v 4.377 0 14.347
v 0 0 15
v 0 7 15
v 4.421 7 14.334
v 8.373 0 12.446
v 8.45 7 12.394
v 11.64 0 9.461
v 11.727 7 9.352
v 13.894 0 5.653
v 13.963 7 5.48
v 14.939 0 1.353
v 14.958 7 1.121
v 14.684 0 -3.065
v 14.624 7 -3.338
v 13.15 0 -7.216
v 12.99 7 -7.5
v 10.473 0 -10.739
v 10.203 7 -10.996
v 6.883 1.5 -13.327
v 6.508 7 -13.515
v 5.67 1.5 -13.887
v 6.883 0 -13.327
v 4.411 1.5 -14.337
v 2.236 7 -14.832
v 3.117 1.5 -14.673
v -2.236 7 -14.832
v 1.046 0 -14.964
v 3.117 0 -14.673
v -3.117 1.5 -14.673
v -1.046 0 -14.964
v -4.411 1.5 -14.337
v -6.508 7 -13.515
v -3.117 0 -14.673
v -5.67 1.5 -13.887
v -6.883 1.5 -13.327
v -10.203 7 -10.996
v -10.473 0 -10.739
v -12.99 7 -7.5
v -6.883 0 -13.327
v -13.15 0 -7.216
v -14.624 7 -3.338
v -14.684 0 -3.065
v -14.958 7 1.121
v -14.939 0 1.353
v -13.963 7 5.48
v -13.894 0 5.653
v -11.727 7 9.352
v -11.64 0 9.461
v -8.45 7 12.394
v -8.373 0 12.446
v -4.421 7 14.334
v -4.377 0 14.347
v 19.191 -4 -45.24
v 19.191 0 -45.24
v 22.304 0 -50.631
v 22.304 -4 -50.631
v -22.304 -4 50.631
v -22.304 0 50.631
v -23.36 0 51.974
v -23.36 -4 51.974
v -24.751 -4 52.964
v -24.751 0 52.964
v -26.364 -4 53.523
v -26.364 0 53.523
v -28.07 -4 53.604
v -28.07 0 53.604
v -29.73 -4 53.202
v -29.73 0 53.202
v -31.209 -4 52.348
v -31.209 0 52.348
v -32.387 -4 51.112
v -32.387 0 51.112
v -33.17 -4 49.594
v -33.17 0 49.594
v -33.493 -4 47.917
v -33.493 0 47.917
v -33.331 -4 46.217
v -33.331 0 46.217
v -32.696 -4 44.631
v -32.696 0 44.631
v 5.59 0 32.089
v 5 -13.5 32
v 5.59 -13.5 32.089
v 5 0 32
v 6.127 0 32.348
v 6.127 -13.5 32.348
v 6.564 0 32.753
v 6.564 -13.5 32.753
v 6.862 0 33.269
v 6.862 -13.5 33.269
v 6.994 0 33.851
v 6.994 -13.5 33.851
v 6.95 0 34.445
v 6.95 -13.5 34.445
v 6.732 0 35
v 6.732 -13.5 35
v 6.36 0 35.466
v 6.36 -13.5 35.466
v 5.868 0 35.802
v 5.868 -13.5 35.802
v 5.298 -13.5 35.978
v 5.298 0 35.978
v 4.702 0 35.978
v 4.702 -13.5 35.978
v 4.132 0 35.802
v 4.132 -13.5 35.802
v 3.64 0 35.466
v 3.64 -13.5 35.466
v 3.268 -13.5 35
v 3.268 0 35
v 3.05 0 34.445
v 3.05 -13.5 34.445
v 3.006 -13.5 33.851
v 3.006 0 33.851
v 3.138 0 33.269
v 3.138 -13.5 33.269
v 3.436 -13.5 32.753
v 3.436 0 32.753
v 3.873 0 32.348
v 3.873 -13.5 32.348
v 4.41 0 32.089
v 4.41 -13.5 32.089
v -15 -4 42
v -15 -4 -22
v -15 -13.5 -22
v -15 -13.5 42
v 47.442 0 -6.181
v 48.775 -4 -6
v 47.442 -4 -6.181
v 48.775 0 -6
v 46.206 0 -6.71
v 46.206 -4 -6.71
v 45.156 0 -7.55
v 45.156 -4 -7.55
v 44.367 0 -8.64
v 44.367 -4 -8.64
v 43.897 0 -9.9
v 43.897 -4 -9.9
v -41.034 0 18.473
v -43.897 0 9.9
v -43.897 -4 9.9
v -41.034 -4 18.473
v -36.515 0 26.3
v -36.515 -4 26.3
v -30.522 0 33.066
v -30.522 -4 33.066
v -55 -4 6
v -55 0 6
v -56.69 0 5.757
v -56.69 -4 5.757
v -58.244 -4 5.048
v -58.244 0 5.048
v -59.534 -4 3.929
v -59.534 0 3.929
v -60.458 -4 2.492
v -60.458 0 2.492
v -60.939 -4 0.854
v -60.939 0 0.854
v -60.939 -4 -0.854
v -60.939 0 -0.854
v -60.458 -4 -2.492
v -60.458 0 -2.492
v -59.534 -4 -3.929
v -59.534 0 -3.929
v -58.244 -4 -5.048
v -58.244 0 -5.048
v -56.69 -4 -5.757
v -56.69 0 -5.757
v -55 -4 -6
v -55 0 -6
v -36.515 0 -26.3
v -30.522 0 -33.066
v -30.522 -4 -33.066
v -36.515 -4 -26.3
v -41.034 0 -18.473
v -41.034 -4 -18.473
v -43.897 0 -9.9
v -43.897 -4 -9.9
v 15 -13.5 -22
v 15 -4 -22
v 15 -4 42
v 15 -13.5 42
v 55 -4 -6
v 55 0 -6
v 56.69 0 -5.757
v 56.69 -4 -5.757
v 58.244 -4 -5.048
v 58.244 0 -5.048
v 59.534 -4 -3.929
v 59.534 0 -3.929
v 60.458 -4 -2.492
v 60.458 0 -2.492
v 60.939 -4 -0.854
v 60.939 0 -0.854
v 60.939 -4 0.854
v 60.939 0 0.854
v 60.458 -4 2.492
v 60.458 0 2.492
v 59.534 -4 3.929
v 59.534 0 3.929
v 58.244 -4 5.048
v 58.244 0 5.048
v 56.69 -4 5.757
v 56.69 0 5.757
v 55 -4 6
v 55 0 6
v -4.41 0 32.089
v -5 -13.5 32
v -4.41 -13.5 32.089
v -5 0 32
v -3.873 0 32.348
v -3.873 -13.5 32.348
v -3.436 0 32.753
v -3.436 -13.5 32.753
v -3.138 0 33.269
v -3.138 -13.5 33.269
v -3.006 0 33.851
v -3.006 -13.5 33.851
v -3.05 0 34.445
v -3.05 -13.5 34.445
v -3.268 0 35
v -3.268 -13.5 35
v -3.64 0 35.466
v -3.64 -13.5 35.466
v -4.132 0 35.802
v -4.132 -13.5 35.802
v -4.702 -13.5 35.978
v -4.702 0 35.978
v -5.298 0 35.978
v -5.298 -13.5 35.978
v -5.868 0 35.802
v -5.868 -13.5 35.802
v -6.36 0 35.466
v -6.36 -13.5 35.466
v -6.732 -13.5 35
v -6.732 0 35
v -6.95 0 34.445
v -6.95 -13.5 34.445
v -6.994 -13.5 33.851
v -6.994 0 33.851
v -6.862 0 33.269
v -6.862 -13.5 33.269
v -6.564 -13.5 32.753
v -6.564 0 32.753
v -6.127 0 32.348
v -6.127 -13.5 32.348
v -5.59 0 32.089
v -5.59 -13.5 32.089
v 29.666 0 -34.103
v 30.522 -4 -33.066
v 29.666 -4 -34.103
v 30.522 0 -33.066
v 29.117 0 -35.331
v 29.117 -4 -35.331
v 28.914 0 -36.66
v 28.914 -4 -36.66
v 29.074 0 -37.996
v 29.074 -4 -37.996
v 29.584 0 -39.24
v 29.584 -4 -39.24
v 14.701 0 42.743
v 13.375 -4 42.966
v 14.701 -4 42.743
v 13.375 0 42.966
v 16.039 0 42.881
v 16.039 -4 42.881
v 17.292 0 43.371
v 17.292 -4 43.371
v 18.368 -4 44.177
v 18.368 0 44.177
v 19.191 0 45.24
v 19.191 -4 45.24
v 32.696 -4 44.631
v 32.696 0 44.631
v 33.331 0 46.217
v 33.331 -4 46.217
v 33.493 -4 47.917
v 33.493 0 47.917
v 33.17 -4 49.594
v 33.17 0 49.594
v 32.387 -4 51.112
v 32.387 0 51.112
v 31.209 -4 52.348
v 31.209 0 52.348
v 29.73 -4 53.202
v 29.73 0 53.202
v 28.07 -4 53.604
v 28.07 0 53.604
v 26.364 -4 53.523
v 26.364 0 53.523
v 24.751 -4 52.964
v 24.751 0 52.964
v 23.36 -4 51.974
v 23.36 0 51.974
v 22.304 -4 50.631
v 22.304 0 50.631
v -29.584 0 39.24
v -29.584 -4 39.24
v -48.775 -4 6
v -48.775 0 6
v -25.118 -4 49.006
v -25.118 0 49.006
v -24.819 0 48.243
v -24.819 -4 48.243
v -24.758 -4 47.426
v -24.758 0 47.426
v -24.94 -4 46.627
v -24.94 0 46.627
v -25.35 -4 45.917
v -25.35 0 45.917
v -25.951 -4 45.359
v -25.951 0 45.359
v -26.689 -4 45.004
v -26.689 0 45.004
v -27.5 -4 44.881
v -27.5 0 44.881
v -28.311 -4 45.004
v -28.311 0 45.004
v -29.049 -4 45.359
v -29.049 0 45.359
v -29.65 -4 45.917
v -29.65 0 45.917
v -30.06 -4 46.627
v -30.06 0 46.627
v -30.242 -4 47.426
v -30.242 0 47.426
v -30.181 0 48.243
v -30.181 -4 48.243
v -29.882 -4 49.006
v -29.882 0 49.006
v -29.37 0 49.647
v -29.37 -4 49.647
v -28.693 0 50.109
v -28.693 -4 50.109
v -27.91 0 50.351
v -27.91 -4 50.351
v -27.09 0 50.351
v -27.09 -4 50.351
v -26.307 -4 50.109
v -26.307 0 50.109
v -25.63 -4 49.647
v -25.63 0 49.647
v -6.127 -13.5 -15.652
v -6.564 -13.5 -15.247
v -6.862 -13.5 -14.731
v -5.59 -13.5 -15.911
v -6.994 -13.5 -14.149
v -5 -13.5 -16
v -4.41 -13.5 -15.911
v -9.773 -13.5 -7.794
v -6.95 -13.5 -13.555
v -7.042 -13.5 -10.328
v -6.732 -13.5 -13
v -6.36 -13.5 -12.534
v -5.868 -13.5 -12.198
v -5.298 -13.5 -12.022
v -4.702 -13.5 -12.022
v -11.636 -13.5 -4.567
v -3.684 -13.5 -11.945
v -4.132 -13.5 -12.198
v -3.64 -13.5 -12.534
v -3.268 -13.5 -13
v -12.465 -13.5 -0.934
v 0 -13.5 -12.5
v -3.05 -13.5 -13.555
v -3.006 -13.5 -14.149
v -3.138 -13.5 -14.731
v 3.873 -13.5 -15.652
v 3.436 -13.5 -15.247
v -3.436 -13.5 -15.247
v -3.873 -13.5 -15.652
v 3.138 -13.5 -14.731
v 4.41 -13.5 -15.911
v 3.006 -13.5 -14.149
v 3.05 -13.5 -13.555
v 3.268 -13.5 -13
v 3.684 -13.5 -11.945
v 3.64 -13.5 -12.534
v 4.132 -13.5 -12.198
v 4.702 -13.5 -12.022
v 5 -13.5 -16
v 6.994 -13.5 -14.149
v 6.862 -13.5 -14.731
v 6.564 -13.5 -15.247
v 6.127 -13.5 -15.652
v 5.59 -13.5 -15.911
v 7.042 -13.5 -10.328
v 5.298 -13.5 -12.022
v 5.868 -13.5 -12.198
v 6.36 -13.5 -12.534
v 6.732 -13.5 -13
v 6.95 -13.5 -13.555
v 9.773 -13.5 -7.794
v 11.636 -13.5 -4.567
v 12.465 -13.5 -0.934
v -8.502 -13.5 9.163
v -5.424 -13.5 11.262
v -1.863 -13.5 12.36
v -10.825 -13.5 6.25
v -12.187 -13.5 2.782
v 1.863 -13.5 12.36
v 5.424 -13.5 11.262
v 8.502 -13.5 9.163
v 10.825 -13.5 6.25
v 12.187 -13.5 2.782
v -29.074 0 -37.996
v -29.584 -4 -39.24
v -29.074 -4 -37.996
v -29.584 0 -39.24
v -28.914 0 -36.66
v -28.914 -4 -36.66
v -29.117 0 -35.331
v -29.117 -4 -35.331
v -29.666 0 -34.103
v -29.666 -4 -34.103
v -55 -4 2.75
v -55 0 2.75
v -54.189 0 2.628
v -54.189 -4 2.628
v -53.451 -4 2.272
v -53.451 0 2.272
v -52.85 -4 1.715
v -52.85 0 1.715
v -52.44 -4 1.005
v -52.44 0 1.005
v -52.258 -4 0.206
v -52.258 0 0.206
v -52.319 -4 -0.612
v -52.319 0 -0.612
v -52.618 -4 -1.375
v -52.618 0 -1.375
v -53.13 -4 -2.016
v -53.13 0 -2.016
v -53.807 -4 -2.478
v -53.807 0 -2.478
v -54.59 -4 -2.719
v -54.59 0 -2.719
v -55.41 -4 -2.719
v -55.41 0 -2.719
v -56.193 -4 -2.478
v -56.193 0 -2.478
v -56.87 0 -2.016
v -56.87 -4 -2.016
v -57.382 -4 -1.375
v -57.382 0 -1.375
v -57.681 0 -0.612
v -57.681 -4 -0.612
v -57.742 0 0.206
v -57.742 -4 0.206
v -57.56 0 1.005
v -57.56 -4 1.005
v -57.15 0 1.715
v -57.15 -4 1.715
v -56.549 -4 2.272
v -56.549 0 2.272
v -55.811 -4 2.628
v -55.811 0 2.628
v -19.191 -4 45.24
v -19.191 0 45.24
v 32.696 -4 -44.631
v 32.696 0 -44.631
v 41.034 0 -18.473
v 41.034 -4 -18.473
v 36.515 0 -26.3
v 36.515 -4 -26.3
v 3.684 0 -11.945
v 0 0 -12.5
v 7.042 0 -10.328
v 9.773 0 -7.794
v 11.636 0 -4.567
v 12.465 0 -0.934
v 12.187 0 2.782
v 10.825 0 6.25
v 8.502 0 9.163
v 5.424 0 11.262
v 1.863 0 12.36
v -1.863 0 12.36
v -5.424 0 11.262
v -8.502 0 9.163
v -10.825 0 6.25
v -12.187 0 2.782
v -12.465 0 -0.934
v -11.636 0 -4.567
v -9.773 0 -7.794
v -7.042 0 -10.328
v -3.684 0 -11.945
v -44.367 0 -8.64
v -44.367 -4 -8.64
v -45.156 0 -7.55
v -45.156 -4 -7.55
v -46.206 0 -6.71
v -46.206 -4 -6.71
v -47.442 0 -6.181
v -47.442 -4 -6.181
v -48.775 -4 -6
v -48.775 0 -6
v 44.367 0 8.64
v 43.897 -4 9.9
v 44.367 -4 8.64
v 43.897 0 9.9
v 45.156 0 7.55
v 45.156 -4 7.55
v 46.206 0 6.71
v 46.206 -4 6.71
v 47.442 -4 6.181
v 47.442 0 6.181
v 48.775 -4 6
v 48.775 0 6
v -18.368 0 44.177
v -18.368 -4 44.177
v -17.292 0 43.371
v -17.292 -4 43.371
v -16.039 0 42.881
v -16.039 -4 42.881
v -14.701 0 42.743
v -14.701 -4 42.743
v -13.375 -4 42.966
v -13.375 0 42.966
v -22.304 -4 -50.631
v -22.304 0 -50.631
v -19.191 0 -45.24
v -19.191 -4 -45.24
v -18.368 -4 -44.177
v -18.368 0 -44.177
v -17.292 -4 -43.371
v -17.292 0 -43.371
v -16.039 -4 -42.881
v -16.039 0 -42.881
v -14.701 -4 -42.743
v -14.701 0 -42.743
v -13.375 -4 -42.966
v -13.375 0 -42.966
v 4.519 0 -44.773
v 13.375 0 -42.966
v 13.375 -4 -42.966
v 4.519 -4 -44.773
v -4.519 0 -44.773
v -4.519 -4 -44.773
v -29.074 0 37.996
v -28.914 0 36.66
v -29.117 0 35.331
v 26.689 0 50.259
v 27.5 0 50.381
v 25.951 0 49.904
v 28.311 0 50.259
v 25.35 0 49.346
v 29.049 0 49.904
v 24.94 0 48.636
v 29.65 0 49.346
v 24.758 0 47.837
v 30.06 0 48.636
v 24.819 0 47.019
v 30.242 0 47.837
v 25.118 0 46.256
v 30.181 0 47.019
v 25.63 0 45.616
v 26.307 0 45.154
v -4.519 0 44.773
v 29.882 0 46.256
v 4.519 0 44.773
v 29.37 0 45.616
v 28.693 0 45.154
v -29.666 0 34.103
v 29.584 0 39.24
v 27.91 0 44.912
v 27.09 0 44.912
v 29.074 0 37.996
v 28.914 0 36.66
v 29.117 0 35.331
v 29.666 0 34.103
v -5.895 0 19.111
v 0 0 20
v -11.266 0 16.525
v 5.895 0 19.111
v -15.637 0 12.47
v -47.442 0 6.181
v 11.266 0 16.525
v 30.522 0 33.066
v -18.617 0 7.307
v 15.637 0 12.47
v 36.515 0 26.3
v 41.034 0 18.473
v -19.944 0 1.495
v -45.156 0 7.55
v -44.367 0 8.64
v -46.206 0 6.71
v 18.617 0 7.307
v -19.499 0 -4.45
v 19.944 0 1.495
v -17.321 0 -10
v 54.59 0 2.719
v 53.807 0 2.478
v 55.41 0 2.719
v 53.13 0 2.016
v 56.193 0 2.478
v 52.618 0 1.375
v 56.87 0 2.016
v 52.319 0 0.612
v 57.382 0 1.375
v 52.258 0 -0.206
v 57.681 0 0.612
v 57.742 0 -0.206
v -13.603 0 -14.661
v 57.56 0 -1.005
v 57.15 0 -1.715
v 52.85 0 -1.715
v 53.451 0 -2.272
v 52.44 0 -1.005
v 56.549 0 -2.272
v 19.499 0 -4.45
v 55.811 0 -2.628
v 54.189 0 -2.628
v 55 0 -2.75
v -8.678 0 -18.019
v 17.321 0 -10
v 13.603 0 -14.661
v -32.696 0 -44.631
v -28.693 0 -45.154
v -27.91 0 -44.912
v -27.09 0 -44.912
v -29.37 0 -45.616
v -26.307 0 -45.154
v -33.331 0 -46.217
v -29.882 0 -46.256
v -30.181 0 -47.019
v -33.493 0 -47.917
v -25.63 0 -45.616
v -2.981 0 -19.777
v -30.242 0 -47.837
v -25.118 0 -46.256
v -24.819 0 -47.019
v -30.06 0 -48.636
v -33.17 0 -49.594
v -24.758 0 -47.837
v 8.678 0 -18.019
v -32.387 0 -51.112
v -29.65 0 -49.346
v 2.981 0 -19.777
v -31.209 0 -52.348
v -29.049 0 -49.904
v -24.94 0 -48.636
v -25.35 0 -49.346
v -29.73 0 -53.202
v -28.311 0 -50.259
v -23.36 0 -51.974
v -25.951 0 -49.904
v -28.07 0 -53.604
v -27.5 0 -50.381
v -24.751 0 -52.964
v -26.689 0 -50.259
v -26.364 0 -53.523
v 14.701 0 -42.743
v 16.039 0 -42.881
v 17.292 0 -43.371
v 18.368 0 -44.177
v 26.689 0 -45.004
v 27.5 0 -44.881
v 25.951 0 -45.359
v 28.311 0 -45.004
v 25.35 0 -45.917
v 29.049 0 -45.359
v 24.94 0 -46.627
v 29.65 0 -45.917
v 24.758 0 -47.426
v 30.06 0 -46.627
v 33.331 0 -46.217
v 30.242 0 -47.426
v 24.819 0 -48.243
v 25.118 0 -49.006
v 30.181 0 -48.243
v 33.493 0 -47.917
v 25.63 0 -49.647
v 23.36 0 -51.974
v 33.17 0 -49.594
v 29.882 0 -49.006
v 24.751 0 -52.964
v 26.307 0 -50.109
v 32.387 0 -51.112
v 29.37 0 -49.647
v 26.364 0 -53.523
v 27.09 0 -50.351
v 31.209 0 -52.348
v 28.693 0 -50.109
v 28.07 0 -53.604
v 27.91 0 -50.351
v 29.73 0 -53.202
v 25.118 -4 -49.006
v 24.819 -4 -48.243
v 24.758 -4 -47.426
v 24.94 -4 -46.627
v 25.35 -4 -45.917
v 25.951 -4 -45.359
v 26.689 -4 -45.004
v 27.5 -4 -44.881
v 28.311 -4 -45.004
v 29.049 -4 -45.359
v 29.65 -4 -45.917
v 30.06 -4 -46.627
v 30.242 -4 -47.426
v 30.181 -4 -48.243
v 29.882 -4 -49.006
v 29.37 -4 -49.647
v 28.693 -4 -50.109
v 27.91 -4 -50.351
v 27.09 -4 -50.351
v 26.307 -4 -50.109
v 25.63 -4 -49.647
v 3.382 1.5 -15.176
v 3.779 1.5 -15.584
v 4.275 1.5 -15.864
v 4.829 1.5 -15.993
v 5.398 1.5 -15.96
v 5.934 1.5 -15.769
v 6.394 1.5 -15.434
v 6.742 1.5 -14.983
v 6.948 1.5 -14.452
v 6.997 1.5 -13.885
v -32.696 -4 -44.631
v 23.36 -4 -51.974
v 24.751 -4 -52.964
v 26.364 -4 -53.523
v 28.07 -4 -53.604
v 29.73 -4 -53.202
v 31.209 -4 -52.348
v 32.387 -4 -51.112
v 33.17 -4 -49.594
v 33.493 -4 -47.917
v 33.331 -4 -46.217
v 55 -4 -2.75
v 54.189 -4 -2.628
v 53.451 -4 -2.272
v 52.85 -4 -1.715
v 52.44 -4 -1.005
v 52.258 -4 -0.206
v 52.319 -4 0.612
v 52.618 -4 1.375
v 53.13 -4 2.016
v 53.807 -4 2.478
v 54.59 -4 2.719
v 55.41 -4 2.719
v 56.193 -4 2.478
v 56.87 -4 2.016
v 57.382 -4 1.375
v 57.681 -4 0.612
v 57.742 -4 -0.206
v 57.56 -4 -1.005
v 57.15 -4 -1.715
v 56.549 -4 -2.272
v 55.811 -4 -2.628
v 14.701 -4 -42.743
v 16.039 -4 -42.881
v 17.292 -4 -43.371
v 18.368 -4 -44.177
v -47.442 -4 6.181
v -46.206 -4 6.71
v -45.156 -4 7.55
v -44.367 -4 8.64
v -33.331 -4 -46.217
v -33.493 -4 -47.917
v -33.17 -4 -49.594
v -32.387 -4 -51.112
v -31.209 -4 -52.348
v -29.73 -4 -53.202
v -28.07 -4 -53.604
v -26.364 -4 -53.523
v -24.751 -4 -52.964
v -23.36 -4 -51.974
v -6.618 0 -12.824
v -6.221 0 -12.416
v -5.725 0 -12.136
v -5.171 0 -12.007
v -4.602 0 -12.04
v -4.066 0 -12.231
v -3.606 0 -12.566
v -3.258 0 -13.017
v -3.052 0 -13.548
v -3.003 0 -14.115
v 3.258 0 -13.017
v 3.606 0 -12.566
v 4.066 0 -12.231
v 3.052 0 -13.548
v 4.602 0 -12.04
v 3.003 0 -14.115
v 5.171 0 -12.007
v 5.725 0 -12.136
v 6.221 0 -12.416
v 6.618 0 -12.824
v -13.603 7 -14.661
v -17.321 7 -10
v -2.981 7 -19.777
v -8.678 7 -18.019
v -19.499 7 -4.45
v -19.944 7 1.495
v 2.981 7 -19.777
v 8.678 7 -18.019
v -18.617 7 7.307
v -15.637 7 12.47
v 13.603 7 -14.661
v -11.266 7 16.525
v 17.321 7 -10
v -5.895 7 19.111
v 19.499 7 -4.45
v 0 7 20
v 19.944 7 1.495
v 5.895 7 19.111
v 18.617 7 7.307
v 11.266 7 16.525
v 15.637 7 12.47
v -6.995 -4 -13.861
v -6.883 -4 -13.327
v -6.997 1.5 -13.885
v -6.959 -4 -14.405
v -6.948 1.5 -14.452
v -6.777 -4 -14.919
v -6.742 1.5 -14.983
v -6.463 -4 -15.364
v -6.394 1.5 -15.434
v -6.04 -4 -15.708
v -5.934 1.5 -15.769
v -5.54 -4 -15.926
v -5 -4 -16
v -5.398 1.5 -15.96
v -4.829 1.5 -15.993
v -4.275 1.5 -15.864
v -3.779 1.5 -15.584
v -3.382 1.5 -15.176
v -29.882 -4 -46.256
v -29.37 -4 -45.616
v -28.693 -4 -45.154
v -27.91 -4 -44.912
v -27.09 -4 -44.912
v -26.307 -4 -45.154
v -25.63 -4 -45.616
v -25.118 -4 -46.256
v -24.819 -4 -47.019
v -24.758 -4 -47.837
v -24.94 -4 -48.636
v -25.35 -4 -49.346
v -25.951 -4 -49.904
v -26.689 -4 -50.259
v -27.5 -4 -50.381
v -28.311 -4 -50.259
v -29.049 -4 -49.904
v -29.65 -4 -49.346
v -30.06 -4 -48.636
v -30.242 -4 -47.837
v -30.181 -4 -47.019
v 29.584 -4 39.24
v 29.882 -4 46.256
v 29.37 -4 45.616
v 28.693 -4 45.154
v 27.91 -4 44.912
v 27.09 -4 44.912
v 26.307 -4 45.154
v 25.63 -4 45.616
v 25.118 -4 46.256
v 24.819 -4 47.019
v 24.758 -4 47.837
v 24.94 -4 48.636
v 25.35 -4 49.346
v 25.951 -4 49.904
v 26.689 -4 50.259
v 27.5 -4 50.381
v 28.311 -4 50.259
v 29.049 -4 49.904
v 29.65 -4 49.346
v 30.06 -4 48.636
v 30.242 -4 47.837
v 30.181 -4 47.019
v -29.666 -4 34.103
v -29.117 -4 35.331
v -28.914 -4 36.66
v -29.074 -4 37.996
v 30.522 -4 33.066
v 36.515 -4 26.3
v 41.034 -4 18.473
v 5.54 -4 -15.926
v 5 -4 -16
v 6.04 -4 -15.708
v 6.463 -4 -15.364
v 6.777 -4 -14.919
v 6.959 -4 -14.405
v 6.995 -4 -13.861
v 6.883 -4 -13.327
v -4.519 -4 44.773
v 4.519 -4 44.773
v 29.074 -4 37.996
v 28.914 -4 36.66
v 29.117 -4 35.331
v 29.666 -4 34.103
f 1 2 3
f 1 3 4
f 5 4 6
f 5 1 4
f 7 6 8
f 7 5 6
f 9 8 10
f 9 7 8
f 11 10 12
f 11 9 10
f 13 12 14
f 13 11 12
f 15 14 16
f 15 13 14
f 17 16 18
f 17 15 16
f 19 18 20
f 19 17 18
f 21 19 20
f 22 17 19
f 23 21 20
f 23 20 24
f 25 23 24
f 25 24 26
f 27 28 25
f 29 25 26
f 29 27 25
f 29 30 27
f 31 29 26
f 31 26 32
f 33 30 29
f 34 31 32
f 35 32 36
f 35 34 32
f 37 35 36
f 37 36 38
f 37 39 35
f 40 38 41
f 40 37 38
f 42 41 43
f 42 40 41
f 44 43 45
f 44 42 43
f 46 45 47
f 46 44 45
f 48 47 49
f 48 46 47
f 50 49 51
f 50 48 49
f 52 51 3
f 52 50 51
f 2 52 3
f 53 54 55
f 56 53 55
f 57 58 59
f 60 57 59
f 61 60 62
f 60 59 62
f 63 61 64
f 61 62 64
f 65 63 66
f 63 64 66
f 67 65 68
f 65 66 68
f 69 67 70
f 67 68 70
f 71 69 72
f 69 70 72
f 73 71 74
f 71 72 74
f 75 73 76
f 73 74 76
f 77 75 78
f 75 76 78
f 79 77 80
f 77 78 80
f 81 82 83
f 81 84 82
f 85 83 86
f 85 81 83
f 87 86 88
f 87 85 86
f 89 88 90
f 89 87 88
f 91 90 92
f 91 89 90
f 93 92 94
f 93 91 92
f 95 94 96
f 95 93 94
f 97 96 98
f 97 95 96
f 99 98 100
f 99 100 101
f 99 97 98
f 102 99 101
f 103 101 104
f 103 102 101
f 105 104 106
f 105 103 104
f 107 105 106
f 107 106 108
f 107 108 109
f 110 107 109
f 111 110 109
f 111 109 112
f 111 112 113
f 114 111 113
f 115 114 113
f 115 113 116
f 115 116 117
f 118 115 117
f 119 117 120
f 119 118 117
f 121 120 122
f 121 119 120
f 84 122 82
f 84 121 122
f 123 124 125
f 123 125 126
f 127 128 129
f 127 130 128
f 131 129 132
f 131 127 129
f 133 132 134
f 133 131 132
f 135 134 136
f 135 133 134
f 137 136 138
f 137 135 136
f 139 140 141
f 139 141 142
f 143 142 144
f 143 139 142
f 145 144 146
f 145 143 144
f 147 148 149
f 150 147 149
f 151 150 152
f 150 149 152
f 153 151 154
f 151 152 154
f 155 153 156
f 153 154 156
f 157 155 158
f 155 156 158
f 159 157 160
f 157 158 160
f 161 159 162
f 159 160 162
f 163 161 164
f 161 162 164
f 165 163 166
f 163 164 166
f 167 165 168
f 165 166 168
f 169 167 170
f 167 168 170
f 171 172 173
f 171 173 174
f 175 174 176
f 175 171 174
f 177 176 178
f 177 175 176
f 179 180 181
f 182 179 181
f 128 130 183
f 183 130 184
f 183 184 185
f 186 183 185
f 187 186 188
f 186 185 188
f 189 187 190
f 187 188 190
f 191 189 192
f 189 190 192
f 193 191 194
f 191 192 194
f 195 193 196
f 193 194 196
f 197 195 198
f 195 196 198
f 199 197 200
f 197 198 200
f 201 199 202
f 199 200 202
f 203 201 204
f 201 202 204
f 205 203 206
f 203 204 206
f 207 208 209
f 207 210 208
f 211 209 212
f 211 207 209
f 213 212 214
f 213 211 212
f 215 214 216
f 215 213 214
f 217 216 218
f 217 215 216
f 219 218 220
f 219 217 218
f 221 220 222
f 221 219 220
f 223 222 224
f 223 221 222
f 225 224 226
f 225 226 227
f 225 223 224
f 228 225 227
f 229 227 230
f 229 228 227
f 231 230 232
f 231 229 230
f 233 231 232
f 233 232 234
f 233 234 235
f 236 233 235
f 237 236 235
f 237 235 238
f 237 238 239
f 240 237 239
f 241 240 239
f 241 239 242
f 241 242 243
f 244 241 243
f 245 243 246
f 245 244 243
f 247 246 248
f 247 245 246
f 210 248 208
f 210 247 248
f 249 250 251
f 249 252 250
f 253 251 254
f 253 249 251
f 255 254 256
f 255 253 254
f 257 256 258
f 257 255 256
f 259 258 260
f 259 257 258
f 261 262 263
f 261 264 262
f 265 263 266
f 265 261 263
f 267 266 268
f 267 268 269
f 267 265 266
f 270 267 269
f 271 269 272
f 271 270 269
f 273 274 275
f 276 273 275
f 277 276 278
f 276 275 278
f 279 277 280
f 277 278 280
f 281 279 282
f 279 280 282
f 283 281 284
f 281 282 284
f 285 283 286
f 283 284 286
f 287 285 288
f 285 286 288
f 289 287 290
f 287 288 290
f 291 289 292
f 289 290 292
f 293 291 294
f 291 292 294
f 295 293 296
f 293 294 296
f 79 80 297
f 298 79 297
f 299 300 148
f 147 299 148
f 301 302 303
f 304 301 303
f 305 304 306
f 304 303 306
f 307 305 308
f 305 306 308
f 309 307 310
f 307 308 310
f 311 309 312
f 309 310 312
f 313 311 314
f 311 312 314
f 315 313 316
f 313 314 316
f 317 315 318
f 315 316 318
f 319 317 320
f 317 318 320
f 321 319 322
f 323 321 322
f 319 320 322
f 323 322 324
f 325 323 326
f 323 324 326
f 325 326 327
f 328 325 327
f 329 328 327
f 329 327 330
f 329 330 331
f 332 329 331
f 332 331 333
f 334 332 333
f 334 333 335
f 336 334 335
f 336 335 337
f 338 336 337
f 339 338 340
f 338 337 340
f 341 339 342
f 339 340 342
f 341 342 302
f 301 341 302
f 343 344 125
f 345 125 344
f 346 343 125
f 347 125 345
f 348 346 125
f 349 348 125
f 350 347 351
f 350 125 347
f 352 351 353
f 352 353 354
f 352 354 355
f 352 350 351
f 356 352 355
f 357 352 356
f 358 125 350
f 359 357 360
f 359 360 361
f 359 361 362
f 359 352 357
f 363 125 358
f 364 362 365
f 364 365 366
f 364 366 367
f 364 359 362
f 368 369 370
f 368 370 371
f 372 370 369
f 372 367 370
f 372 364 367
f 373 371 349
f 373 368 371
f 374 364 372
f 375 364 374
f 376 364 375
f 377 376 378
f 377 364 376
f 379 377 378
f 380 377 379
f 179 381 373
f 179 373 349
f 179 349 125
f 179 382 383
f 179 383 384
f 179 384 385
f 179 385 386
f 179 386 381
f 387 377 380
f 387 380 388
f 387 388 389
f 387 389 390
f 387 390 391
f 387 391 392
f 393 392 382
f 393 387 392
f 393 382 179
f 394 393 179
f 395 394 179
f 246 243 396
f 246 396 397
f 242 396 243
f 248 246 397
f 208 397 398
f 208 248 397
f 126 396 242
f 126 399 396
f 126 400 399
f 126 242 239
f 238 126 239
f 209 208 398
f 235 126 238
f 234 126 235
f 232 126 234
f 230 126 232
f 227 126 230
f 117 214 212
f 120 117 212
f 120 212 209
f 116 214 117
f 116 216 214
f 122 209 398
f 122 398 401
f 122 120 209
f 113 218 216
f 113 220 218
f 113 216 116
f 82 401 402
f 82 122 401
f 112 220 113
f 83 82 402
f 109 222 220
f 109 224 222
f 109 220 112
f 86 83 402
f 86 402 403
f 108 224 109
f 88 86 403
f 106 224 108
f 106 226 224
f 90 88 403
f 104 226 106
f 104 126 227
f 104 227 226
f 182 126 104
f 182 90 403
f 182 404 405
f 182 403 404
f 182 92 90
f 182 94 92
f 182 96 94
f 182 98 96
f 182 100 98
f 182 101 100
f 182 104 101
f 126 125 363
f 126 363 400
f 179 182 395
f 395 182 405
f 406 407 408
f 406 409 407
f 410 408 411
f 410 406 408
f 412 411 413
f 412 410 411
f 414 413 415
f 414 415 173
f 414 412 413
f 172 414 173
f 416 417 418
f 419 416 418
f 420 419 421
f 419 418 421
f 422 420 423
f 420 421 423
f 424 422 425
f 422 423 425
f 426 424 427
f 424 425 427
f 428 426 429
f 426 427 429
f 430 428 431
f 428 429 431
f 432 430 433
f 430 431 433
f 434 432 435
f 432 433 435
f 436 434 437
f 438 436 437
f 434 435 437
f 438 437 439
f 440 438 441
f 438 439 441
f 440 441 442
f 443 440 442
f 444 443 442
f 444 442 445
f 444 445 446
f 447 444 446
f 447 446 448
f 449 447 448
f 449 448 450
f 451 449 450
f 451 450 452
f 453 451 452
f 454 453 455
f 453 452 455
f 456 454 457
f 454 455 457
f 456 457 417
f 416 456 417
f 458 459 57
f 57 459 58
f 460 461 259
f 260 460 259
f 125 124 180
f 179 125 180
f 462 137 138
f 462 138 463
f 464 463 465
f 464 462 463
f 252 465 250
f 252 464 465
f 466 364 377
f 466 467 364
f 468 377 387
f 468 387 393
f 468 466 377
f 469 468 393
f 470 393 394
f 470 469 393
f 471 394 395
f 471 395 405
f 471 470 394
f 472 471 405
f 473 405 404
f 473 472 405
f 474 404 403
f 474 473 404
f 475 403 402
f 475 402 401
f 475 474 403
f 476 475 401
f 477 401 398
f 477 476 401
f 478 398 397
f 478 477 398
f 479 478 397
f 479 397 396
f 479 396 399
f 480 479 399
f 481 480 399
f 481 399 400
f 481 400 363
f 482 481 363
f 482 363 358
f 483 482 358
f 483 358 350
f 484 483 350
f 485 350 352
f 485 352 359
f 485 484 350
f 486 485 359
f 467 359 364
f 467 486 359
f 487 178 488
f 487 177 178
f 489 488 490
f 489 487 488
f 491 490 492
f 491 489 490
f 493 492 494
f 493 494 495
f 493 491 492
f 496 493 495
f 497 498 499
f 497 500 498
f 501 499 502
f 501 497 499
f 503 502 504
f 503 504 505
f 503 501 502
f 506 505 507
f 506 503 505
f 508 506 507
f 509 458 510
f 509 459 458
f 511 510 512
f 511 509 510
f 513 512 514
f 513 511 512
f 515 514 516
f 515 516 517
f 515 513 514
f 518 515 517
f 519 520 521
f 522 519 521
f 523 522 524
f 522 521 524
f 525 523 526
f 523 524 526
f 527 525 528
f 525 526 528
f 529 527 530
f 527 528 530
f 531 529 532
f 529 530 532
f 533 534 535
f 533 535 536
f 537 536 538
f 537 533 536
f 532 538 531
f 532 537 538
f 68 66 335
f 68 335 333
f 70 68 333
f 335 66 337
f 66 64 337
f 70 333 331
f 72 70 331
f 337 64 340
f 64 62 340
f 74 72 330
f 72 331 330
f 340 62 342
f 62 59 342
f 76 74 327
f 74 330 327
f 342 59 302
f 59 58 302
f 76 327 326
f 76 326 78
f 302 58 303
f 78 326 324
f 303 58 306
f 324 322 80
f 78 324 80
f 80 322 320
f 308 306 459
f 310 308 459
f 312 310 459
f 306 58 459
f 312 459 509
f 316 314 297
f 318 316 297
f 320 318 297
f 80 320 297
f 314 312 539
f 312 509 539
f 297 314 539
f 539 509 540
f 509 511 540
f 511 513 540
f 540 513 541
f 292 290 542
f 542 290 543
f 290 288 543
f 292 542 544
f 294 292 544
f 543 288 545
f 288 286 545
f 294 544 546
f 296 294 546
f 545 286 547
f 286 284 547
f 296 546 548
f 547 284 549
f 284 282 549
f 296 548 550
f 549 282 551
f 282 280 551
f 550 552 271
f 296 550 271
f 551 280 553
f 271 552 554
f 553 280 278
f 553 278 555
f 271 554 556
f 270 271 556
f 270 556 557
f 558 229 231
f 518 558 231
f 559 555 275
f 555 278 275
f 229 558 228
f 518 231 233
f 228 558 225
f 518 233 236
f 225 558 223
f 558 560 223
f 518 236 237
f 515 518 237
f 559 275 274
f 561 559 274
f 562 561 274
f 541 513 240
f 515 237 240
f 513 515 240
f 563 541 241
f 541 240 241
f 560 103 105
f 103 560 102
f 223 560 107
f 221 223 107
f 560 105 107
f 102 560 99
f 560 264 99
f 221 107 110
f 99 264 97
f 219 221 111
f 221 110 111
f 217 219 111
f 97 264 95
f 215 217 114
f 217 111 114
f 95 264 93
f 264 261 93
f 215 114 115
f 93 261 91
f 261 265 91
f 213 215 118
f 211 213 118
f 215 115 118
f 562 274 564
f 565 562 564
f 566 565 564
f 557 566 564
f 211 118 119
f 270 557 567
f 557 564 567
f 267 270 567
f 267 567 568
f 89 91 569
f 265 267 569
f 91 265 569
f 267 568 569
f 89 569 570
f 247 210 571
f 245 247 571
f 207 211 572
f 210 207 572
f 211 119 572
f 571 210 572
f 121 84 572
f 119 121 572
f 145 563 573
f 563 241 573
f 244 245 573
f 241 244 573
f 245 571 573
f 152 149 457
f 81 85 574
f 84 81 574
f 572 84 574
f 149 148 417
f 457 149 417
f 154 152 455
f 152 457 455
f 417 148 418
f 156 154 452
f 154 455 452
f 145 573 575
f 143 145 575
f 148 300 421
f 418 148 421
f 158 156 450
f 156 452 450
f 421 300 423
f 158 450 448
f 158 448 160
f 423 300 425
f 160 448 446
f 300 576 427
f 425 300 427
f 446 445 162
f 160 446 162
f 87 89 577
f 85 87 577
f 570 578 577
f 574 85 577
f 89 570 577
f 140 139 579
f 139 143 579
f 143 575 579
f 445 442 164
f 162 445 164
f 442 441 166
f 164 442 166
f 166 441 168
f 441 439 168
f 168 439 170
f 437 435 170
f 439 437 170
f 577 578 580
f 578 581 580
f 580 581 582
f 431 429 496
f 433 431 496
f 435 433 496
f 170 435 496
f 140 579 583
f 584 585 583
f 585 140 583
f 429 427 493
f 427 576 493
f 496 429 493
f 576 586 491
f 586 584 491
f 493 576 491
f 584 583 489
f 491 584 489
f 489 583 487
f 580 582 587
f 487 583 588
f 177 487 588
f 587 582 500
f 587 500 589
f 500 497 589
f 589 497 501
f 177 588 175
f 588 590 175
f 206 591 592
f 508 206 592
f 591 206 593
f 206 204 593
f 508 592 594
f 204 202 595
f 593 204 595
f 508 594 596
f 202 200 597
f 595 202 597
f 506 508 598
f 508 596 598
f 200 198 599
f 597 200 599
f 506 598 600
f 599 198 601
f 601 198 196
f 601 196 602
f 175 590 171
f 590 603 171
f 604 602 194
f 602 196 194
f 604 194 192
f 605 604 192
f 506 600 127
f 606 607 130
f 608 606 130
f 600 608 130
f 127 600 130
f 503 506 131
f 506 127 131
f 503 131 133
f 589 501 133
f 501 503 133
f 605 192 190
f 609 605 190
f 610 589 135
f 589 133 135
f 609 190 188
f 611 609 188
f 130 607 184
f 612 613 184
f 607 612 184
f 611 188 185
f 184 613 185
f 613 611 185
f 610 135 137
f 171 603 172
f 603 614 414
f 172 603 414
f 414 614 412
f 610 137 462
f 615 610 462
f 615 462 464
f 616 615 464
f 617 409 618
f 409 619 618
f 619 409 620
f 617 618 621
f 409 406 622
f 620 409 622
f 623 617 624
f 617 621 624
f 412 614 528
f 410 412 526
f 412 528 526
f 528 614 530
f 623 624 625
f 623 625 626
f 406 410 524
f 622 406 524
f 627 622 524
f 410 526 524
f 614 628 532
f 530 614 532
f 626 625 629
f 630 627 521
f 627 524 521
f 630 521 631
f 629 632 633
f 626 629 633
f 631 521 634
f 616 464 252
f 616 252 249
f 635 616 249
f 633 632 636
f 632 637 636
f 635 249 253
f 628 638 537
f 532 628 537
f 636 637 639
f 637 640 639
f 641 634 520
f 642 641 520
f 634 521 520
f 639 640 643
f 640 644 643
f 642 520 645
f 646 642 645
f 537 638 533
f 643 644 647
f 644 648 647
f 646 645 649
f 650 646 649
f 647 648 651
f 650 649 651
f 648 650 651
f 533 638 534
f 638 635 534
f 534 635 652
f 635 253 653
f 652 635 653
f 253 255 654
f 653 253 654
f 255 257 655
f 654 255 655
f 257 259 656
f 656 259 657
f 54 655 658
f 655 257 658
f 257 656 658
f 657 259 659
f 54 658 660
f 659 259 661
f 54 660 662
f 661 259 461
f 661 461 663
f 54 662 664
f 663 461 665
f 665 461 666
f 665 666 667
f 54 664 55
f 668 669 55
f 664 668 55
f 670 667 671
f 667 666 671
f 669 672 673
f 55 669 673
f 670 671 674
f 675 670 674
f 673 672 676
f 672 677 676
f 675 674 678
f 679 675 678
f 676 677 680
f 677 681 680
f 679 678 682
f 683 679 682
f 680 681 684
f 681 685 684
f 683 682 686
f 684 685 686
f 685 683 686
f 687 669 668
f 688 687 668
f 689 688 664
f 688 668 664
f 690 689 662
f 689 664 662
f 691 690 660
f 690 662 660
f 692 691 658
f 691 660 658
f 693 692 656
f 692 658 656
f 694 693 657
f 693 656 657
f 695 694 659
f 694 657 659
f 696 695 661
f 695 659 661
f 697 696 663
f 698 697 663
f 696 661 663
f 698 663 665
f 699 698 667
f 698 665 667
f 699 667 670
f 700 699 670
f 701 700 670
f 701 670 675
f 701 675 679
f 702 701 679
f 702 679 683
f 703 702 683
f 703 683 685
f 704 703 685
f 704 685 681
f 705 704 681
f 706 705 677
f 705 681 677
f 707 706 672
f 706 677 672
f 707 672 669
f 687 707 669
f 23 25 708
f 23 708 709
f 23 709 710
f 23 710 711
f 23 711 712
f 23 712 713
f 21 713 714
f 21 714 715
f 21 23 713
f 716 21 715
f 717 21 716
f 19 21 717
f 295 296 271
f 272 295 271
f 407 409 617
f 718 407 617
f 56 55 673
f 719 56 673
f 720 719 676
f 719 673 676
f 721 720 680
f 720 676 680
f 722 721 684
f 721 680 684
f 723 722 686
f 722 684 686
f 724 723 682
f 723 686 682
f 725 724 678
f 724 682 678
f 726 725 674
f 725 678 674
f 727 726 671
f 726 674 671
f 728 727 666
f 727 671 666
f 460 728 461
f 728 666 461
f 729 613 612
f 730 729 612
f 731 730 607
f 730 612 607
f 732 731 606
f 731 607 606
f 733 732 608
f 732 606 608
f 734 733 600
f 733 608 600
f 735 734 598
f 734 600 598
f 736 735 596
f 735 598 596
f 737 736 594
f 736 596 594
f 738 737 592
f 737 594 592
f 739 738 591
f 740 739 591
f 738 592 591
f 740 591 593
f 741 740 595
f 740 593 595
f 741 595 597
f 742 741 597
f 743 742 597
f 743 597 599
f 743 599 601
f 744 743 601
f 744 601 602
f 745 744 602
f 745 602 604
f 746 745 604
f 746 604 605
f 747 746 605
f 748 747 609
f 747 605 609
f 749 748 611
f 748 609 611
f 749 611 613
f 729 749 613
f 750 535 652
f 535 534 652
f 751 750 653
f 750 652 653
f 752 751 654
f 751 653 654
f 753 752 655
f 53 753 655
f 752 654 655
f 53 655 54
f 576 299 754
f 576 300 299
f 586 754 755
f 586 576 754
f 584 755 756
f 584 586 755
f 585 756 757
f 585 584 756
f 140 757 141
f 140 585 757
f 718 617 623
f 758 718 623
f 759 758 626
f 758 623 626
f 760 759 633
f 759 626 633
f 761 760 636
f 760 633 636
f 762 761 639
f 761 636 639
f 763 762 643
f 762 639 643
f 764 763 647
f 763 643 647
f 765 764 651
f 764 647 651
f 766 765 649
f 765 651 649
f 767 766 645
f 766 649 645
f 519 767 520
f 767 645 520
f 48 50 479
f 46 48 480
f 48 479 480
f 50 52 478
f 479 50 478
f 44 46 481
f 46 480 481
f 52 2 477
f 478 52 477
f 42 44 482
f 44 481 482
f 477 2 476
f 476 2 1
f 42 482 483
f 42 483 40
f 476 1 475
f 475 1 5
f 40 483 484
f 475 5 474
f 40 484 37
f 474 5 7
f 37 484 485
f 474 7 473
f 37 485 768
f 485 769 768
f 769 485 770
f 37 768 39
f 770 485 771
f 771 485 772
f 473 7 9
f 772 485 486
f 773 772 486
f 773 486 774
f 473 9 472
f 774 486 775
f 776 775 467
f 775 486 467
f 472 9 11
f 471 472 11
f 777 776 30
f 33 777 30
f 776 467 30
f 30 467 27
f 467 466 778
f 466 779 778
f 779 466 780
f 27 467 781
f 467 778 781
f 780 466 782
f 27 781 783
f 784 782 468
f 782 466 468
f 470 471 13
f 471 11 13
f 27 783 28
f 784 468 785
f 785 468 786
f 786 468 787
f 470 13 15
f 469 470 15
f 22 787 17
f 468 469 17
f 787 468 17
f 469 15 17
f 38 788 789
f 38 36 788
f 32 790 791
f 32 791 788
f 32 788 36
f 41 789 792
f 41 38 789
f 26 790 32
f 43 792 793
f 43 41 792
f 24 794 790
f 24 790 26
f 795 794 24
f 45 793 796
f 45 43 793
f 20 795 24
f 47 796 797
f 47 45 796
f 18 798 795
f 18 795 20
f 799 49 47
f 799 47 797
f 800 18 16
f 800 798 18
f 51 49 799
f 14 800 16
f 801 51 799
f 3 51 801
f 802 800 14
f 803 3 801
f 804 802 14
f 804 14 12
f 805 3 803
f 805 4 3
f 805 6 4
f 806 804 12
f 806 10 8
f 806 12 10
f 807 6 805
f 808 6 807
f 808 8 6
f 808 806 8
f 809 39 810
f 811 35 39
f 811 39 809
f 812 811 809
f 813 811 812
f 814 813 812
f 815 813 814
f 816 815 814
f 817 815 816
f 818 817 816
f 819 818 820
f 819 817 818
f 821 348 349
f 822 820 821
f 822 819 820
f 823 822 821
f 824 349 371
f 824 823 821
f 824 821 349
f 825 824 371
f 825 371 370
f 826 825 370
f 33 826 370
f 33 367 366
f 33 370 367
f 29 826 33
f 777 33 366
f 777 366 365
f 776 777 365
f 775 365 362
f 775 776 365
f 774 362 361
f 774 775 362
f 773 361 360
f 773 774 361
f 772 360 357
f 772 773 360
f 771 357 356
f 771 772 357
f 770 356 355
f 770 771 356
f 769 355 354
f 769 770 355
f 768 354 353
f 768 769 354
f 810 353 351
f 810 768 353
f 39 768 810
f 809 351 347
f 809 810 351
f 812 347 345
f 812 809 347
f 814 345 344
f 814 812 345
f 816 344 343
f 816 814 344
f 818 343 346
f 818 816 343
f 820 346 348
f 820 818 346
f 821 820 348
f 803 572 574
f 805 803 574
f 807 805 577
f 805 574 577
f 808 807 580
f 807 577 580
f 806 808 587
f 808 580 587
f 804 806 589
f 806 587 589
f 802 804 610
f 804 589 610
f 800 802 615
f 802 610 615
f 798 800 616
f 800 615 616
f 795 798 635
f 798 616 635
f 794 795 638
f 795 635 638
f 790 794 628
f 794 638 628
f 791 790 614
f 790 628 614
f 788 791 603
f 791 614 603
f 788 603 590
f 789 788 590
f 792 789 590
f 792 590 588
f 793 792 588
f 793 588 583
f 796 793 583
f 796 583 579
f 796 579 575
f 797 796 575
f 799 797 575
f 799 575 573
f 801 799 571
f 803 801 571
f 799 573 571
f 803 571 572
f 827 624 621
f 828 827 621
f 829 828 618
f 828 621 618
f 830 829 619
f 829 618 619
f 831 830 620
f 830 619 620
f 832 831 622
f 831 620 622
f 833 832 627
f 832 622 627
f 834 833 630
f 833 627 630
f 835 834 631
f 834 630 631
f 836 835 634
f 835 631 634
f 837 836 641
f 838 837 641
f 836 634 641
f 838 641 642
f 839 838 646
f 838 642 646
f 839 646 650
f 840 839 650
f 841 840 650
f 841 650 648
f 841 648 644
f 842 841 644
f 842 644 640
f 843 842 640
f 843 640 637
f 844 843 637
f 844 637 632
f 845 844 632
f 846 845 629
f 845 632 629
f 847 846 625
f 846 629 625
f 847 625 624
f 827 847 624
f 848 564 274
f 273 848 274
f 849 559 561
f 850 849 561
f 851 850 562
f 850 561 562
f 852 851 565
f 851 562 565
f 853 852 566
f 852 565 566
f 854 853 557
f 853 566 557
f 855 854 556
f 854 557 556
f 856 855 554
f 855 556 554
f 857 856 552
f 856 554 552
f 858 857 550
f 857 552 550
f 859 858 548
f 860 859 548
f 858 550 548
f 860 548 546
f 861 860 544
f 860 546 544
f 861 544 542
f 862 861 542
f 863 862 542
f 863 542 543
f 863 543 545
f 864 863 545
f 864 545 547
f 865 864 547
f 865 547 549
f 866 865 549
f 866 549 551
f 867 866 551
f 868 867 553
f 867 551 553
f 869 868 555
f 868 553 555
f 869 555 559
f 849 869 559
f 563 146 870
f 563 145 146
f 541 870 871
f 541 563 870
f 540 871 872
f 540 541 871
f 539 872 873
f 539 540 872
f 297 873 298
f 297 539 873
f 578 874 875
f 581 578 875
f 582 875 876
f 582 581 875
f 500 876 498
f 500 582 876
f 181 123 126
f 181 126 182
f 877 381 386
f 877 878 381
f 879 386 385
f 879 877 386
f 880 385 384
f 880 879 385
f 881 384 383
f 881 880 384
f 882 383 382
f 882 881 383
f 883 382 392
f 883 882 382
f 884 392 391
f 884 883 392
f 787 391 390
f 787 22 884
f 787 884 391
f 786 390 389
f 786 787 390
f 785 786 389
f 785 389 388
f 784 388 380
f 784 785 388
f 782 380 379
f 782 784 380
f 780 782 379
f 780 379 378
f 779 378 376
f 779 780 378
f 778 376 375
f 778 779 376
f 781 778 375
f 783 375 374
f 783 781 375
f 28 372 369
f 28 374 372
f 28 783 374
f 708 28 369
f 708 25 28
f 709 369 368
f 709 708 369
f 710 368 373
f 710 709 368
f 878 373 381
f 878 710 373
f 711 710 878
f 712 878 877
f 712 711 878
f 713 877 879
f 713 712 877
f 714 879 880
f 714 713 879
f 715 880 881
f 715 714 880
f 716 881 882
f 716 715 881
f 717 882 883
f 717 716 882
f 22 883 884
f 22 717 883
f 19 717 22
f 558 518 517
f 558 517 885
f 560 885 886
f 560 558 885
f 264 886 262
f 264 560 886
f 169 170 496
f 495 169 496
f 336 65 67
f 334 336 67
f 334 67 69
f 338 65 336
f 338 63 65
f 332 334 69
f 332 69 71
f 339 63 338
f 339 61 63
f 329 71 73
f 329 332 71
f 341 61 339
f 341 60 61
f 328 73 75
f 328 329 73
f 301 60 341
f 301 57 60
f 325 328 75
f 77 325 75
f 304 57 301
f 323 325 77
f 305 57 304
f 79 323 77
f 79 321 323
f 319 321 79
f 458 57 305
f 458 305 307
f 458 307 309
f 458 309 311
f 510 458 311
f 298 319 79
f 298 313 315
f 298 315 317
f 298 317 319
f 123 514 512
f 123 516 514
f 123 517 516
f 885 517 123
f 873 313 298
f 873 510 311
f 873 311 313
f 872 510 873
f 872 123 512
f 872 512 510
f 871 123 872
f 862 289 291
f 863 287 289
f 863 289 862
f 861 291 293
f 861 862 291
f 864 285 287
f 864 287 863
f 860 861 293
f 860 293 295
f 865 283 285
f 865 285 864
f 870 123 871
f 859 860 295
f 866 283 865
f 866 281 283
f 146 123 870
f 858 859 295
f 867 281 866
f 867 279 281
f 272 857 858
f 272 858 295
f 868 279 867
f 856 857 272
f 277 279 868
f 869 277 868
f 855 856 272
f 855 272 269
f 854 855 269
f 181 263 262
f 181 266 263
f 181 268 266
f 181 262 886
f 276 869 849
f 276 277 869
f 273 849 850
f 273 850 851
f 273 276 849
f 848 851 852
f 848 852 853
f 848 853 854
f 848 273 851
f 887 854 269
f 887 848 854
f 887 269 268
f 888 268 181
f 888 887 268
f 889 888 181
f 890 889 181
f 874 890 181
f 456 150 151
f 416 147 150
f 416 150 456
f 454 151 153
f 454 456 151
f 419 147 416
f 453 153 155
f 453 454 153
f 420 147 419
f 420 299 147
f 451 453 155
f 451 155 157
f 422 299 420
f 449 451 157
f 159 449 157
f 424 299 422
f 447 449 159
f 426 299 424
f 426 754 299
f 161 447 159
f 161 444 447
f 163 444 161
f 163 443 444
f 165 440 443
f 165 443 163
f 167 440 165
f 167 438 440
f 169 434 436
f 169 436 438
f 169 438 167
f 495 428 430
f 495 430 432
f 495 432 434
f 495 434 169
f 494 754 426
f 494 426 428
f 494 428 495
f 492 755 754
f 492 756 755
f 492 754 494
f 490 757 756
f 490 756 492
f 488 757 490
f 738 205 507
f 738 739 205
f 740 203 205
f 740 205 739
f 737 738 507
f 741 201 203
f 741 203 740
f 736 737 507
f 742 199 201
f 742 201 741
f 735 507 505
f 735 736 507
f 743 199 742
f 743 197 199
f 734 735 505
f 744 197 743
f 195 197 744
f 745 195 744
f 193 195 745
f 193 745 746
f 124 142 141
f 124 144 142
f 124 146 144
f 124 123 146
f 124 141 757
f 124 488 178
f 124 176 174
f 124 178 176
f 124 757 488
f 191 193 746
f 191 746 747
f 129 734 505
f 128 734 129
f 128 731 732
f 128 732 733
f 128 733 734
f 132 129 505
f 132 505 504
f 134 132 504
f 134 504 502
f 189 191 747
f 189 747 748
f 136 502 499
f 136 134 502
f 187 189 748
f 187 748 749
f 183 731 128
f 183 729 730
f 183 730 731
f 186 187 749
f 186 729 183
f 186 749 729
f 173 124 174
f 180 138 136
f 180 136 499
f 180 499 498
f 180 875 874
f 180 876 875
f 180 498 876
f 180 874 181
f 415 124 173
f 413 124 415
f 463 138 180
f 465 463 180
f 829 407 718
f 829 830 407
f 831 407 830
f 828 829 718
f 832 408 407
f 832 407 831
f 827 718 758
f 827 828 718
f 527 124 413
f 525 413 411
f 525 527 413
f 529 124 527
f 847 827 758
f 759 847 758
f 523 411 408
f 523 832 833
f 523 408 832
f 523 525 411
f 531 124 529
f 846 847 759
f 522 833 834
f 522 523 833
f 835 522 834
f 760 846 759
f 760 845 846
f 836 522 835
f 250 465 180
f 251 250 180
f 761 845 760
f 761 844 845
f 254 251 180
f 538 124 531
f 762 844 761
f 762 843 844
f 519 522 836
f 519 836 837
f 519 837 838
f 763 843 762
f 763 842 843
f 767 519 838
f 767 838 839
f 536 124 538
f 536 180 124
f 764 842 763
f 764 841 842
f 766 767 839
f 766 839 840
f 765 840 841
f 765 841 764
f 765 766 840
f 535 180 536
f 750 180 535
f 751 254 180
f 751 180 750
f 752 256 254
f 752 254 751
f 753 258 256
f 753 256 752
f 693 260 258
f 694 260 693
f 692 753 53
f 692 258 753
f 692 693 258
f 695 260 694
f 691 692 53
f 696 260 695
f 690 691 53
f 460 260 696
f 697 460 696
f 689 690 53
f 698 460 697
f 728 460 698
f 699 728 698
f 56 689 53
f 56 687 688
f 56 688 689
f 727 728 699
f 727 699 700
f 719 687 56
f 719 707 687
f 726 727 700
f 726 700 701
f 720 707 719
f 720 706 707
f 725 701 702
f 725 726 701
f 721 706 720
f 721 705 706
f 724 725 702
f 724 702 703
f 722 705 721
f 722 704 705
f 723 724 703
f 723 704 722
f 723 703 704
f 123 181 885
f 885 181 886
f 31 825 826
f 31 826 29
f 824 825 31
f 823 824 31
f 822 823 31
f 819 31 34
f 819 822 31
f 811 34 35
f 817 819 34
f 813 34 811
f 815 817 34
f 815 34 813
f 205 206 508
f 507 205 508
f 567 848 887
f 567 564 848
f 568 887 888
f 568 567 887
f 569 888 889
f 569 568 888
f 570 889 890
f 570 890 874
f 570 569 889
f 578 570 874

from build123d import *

# Parameters (mm, degrees)
SKETCH_1_R               = 20
SKETCH_1_R_2             = 15
EXTRUDE_1_DEPTH          = 7
SKETCH_2_R               = 70
SKETCH_2_R_2             = 12.5
EXTRUDE_2_DEPTH          = 4
SKETCH_3_W               = 30
SKETCH_3_H               = 64
SKETCH_3_R               = 2
SKETCH_3_R_2             = 12.5
EXTRUDE_3_DEPTH          = 9.5
SKETCH_4_R               = 80
SKETCH_4_R_2             = 45
CUT_EXTRUDE_1_DEPTH      = 9.5
CUT_EXTRUDE_START        = -15
SKETCH_6_R               = 2
CUT_EXTRUDE_2_DEPTH      = 15
SKETCH_7_R               = 2.75
EXTRUDE_4_DEPTH          = 4
PATTERN_CIRCULAR_1_COUNT = 6
FILLET_2_R               = 5


with BuildPart() as part:
    # Эскиз1 → Бобышка-Вытянуть1 (new body)
    with BuildSketch(Plane(origin=(0, 0, 0), x_dir=(1, 0, 0), z_dir=(0, 1, 0))):
        with Locations(Location((0, 0, 0), (0, 0, 270))):
            Circle(SKETCH_1_R)
        with Locations(Location((0, 0, 0), (0, 0, 270))):
            Circle(SKETCH_1_R_2, mode=Mode.SUBTRACT)
    extrude(amount=EXTRUDE_1_DEPTH)

    # Эскиз2 → Бобышка-Вытянуть2 (add)
    with BuildSketch(Plane.XZ):
        with Locations(Location((0, 0, 0), (0, 0, 270))):
            Circle(SKETCH_2_R)
        with Locations(Location((0, 0, 0), (0, 0, 270))):
            Circle(SKETCH_2_R_2, mode=Mode.SUBTRACT)
    extrude(amount=EXTRUDE_2_DEPTH)

    # Эскиз3 → Бобышка-Вытянуть3 (add)
    with BuildSketch(Plane.XZ.offset(4)):
        with Locations((0, 10)):
            Rectangle(SKETCH_3_W, SKETCH_3_H)
        with Locations(Location((-5, 34, 0), (0, 0, 270))):
            Circle(SKETCH_3_R, mode=Mode.SUBTRACT)
        with Locations(Location((5, 34, 0), (0, 0, 270))):
            Circle(SKETCH_3_R, mode=Mode.SUBTRACT)
        with Locations(Location((-5, -14, 0), (0, 0, 270))):
            Circle(SKETCH_3_R, mode=Mode.SUBTRACT)
        with Locations(Location((5, -14, 0), (0, 0, 270))):
            Circle(SKETCH_3_R, mode=Mode.SUBTRACT)
        with Locations(Location((0, 0, 0), (0, 0, 270))):
            Circle(SKETCH_3_R_2, mode=Mode.SUBTRACT)
    extrude(amount=EXTRUDE_3_DEPTH)

    # Эскиз4 → Вырез-Вытянуть1 (cut)
    with BuildSketch(Plane(origin=(0, 0, 0), x_dir=(1, 0, 0), z_dir=(0, 1, 0))):
        Circle(SKETCH_4_R)
        with Locations(Location((0, 0, 0), (0, 0, 270))):
            Circle(SKETCH_4_R_2, mode=Mode.SUBTRACT)
    extrude(amount=-CUT_EXTRUDE_1_DEPTH, mode=Mode.SUBTRACT)

    # Эскиз6 → Вырез-Вытянуть2 (cut)
    with BuildSketch(Plane.XZ.offset(13.5).offset(CUT_EXTRUDE_START)):
        with Locations(Location((-5, 34, 0), (0, 0, 270))):
            Circle(SKETCH_6_R)
        with Locations(Location((5, 34, 0), (0, 0, 270))):
            Circle(SKETCH_6_R)
        with Locations(Location((-5, -14, 0), (0, 0, 160.346175942))):
            Circle(SKETCH_6_R)
        with Locations(Location((5, -14, 0), (0, 0, 19.653824058))):
            Circle(SKETCH_6_R)
    extrude(amount=CUT_EXTRUDE_2_DEPTH, mode=Mode.SUBTRACT)

    # Эскиз7 → Бобышка-Вытянуть4 (add)
    with BuildSketch(Plane(origin=(0, 0, 0), x_dir=(1, 0, 0), z_dir=(0, 1, 0))):
        with BuildLine():
            Line((-55, 6), (-40, 6))
            Line((-40, 6), (-40, -6))
            Line((-40, -6), (-55, -6))
            ThreePointArc((-55, -6), (-61, 0), (-55, 6))
        make_face()
        with Locations(Location((-55, 0, 0), (0, 0, 270))):
            Circle(SKETCH_7_R, mode=Mode.SUBTRACT)
    extrude_4 = extrude(amount=-EXTRUDE_4_DEPTH)

    # Круговой массив1: Бобышка-Вытянуть4 ×6 about axis
    pattern_circular_1_axis = Axis((0, 0, 0), (0, 1, 0))
    for i in range(1, PATTERN_CIRCULAR_1_COUNT):
        add(extrude_4.rotate(pattern_circular_1_axis, i * 360 / PATTERN_CIRCULAR_1_COUNT))

    # Скругление2
    fillet_2_edges = [part.edges().sort_by_distance(p)[0] for p in [
        (-17.102950698, -2, 41.623179569),
        (-27.495255544, -2, 35.623179569),
        (27.495255544, -2, 35.623179569),
        (17.102950698, -2, 41.623179569),
        (44.598206242, -2, -6),
        (44.598206242, -2, 6),
        (17.102950698, -2, -41.623179569),
        (27.495255544, -2, -35.623179569),
        (-27.495255544, -2, -35.623179569),
        (-17.102950698, -2, -41.623179569),
        (-44.598206242, -2, 6),
        (-44.598206242, -2, -6),
    ]]
    fillet(fillet_2_edges, radius=FILLET_2_R)


solid = part.part
